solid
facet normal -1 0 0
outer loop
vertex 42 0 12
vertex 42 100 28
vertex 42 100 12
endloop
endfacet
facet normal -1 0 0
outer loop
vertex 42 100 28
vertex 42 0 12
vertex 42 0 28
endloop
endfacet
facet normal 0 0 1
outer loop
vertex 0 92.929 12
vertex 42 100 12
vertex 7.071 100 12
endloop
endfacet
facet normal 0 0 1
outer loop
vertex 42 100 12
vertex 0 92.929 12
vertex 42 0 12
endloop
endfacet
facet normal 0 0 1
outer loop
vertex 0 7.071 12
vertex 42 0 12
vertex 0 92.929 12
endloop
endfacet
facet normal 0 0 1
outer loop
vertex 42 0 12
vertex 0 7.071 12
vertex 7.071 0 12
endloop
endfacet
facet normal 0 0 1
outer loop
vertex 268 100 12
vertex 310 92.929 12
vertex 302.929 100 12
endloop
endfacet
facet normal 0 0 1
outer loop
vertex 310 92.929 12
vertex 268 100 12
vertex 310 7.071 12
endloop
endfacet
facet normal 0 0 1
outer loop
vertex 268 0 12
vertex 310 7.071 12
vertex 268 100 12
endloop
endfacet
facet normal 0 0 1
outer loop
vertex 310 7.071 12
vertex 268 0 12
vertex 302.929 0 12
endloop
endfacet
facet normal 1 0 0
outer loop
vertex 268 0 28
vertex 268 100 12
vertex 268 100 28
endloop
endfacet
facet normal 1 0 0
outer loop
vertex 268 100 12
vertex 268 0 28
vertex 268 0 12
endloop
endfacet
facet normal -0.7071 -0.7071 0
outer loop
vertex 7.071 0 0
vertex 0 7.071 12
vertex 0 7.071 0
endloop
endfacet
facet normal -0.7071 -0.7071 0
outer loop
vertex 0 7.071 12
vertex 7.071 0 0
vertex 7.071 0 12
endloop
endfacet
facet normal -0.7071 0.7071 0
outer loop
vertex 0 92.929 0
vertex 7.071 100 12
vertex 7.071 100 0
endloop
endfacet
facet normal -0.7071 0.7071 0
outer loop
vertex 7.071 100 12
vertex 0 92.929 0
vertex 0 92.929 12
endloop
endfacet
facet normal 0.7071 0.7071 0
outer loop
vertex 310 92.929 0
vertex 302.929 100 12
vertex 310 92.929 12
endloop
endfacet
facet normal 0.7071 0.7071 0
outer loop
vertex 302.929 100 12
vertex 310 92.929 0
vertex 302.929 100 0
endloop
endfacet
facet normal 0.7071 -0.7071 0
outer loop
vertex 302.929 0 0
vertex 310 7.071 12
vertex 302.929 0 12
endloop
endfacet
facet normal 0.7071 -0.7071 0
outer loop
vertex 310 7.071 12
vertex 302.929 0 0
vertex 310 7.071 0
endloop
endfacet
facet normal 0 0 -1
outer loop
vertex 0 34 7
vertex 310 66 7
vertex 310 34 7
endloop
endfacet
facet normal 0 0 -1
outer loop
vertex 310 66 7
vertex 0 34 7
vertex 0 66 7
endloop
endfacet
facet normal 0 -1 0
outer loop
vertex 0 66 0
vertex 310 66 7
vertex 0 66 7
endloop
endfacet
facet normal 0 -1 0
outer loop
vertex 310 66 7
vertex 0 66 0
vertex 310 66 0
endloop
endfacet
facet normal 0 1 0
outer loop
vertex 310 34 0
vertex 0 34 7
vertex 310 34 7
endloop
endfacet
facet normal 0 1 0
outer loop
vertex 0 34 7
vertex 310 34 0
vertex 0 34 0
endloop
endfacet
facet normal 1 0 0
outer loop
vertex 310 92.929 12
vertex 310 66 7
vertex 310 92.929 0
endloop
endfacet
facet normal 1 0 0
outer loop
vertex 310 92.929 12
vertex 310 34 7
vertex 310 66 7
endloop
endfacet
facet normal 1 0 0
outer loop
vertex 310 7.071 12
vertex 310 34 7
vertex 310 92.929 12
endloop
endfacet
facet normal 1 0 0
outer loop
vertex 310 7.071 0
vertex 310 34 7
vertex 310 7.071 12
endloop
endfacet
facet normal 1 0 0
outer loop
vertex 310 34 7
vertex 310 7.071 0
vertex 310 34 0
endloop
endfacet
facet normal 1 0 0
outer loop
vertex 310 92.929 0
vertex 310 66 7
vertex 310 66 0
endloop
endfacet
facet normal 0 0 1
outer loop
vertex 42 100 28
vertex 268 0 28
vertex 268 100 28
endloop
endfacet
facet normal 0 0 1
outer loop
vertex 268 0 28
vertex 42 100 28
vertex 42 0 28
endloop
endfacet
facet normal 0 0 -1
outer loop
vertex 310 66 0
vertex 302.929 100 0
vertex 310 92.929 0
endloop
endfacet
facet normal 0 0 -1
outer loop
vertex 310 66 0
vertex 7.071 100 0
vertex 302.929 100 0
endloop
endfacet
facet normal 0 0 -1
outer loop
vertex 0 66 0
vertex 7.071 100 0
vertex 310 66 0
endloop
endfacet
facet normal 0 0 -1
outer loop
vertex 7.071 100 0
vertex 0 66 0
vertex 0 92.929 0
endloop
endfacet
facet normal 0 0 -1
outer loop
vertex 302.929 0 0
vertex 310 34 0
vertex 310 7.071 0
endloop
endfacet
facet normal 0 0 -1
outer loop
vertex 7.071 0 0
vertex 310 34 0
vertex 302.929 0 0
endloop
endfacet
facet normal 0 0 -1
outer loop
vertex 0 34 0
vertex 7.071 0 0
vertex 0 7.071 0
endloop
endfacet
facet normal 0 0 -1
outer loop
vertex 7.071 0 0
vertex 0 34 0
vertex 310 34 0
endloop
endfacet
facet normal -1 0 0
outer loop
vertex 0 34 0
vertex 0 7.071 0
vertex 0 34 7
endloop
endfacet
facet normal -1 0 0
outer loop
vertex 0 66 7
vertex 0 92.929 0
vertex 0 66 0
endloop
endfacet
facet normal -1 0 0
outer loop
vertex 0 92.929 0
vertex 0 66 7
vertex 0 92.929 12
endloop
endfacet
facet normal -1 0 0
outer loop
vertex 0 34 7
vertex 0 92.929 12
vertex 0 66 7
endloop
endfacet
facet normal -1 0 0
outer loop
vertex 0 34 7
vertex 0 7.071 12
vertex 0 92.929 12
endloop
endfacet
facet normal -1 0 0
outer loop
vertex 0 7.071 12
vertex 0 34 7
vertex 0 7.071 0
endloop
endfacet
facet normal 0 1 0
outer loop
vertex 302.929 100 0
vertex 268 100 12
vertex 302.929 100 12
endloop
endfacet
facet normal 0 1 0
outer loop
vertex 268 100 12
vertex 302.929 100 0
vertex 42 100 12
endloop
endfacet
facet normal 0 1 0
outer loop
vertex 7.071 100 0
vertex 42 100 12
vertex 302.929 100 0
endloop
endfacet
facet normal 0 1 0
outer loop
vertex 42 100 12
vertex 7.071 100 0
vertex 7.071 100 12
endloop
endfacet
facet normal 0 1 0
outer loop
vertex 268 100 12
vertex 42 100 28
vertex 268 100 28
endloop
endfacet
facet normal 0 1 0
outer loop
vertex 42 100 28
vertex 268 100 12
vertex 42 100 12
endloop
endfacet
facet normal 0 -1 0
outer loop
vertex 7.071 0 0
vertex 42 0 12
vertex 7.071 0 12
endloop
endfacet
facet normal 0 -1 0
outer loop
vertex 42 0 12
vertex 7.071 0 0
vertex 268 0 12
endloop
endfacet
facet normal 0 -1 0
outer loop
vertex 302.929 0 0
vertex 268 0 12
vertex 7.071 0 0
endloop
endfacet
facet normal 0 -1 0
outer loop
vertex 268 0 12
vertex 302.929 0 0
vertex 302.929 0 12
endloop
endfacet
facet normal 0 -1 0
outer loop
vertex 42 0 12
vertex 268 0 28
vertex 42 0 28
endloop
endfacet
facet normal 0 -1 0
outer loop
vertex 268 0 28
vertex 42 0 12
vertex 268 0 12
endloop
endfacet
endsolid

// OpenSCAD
include <../src/wardrobe.scad>;
plank_zx_front_middle();
//github_openscad -o wardrobe_3/plank_zx_front_middle.stl -D wardrobe_n=3 -D cutting_edge=0 -D break_view_length=0 wardrobe_3/plank_zx_front_middle_stl.scad
